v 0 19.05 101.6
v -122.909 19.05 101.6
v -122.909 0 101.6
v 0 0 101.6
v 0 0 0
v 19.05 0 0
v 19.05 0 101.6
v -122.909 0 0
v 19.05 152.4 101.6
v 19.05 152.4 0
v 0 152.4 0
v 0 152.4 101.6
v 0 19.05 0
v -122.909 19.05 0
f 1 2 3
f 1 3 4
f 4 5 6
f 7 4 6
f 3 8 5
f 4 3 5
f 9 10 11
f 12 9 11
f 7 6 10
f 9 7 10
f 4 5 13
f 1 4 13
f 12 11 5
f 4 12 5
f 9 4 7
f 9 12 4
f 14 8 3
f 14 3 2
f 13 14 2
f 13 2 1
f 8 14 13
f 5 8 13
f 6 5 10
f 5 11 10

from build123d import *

# Parameters (mm, degrees)
F0_W     = 122.90867
F0_H     = 19.05
F1_DEPTH = 101.6
F2_DEPTH = 101.6


with BuildPart() as f1:
    # F0 (on Top) → F1 (new body)
    with BuildSketch(Plane.XY):
        with Locations((-61.454335, 9.525)):
            Rectangle(F0_W, F0_H)
    extrude(amount=F1_DEPTH)


with BuildPart() as f2:
    # F0 (on Top) → F2 (new body)
    with BuildSketch(Plane.XY):
        Polygon((0, 19.05), (0, 0), (19.05, 0), (19.05, 152.4), (0, 152.4), align=None)
    extrude(amount=F2_DEPTH)


solid = Compound([f1.part, f2.part])
